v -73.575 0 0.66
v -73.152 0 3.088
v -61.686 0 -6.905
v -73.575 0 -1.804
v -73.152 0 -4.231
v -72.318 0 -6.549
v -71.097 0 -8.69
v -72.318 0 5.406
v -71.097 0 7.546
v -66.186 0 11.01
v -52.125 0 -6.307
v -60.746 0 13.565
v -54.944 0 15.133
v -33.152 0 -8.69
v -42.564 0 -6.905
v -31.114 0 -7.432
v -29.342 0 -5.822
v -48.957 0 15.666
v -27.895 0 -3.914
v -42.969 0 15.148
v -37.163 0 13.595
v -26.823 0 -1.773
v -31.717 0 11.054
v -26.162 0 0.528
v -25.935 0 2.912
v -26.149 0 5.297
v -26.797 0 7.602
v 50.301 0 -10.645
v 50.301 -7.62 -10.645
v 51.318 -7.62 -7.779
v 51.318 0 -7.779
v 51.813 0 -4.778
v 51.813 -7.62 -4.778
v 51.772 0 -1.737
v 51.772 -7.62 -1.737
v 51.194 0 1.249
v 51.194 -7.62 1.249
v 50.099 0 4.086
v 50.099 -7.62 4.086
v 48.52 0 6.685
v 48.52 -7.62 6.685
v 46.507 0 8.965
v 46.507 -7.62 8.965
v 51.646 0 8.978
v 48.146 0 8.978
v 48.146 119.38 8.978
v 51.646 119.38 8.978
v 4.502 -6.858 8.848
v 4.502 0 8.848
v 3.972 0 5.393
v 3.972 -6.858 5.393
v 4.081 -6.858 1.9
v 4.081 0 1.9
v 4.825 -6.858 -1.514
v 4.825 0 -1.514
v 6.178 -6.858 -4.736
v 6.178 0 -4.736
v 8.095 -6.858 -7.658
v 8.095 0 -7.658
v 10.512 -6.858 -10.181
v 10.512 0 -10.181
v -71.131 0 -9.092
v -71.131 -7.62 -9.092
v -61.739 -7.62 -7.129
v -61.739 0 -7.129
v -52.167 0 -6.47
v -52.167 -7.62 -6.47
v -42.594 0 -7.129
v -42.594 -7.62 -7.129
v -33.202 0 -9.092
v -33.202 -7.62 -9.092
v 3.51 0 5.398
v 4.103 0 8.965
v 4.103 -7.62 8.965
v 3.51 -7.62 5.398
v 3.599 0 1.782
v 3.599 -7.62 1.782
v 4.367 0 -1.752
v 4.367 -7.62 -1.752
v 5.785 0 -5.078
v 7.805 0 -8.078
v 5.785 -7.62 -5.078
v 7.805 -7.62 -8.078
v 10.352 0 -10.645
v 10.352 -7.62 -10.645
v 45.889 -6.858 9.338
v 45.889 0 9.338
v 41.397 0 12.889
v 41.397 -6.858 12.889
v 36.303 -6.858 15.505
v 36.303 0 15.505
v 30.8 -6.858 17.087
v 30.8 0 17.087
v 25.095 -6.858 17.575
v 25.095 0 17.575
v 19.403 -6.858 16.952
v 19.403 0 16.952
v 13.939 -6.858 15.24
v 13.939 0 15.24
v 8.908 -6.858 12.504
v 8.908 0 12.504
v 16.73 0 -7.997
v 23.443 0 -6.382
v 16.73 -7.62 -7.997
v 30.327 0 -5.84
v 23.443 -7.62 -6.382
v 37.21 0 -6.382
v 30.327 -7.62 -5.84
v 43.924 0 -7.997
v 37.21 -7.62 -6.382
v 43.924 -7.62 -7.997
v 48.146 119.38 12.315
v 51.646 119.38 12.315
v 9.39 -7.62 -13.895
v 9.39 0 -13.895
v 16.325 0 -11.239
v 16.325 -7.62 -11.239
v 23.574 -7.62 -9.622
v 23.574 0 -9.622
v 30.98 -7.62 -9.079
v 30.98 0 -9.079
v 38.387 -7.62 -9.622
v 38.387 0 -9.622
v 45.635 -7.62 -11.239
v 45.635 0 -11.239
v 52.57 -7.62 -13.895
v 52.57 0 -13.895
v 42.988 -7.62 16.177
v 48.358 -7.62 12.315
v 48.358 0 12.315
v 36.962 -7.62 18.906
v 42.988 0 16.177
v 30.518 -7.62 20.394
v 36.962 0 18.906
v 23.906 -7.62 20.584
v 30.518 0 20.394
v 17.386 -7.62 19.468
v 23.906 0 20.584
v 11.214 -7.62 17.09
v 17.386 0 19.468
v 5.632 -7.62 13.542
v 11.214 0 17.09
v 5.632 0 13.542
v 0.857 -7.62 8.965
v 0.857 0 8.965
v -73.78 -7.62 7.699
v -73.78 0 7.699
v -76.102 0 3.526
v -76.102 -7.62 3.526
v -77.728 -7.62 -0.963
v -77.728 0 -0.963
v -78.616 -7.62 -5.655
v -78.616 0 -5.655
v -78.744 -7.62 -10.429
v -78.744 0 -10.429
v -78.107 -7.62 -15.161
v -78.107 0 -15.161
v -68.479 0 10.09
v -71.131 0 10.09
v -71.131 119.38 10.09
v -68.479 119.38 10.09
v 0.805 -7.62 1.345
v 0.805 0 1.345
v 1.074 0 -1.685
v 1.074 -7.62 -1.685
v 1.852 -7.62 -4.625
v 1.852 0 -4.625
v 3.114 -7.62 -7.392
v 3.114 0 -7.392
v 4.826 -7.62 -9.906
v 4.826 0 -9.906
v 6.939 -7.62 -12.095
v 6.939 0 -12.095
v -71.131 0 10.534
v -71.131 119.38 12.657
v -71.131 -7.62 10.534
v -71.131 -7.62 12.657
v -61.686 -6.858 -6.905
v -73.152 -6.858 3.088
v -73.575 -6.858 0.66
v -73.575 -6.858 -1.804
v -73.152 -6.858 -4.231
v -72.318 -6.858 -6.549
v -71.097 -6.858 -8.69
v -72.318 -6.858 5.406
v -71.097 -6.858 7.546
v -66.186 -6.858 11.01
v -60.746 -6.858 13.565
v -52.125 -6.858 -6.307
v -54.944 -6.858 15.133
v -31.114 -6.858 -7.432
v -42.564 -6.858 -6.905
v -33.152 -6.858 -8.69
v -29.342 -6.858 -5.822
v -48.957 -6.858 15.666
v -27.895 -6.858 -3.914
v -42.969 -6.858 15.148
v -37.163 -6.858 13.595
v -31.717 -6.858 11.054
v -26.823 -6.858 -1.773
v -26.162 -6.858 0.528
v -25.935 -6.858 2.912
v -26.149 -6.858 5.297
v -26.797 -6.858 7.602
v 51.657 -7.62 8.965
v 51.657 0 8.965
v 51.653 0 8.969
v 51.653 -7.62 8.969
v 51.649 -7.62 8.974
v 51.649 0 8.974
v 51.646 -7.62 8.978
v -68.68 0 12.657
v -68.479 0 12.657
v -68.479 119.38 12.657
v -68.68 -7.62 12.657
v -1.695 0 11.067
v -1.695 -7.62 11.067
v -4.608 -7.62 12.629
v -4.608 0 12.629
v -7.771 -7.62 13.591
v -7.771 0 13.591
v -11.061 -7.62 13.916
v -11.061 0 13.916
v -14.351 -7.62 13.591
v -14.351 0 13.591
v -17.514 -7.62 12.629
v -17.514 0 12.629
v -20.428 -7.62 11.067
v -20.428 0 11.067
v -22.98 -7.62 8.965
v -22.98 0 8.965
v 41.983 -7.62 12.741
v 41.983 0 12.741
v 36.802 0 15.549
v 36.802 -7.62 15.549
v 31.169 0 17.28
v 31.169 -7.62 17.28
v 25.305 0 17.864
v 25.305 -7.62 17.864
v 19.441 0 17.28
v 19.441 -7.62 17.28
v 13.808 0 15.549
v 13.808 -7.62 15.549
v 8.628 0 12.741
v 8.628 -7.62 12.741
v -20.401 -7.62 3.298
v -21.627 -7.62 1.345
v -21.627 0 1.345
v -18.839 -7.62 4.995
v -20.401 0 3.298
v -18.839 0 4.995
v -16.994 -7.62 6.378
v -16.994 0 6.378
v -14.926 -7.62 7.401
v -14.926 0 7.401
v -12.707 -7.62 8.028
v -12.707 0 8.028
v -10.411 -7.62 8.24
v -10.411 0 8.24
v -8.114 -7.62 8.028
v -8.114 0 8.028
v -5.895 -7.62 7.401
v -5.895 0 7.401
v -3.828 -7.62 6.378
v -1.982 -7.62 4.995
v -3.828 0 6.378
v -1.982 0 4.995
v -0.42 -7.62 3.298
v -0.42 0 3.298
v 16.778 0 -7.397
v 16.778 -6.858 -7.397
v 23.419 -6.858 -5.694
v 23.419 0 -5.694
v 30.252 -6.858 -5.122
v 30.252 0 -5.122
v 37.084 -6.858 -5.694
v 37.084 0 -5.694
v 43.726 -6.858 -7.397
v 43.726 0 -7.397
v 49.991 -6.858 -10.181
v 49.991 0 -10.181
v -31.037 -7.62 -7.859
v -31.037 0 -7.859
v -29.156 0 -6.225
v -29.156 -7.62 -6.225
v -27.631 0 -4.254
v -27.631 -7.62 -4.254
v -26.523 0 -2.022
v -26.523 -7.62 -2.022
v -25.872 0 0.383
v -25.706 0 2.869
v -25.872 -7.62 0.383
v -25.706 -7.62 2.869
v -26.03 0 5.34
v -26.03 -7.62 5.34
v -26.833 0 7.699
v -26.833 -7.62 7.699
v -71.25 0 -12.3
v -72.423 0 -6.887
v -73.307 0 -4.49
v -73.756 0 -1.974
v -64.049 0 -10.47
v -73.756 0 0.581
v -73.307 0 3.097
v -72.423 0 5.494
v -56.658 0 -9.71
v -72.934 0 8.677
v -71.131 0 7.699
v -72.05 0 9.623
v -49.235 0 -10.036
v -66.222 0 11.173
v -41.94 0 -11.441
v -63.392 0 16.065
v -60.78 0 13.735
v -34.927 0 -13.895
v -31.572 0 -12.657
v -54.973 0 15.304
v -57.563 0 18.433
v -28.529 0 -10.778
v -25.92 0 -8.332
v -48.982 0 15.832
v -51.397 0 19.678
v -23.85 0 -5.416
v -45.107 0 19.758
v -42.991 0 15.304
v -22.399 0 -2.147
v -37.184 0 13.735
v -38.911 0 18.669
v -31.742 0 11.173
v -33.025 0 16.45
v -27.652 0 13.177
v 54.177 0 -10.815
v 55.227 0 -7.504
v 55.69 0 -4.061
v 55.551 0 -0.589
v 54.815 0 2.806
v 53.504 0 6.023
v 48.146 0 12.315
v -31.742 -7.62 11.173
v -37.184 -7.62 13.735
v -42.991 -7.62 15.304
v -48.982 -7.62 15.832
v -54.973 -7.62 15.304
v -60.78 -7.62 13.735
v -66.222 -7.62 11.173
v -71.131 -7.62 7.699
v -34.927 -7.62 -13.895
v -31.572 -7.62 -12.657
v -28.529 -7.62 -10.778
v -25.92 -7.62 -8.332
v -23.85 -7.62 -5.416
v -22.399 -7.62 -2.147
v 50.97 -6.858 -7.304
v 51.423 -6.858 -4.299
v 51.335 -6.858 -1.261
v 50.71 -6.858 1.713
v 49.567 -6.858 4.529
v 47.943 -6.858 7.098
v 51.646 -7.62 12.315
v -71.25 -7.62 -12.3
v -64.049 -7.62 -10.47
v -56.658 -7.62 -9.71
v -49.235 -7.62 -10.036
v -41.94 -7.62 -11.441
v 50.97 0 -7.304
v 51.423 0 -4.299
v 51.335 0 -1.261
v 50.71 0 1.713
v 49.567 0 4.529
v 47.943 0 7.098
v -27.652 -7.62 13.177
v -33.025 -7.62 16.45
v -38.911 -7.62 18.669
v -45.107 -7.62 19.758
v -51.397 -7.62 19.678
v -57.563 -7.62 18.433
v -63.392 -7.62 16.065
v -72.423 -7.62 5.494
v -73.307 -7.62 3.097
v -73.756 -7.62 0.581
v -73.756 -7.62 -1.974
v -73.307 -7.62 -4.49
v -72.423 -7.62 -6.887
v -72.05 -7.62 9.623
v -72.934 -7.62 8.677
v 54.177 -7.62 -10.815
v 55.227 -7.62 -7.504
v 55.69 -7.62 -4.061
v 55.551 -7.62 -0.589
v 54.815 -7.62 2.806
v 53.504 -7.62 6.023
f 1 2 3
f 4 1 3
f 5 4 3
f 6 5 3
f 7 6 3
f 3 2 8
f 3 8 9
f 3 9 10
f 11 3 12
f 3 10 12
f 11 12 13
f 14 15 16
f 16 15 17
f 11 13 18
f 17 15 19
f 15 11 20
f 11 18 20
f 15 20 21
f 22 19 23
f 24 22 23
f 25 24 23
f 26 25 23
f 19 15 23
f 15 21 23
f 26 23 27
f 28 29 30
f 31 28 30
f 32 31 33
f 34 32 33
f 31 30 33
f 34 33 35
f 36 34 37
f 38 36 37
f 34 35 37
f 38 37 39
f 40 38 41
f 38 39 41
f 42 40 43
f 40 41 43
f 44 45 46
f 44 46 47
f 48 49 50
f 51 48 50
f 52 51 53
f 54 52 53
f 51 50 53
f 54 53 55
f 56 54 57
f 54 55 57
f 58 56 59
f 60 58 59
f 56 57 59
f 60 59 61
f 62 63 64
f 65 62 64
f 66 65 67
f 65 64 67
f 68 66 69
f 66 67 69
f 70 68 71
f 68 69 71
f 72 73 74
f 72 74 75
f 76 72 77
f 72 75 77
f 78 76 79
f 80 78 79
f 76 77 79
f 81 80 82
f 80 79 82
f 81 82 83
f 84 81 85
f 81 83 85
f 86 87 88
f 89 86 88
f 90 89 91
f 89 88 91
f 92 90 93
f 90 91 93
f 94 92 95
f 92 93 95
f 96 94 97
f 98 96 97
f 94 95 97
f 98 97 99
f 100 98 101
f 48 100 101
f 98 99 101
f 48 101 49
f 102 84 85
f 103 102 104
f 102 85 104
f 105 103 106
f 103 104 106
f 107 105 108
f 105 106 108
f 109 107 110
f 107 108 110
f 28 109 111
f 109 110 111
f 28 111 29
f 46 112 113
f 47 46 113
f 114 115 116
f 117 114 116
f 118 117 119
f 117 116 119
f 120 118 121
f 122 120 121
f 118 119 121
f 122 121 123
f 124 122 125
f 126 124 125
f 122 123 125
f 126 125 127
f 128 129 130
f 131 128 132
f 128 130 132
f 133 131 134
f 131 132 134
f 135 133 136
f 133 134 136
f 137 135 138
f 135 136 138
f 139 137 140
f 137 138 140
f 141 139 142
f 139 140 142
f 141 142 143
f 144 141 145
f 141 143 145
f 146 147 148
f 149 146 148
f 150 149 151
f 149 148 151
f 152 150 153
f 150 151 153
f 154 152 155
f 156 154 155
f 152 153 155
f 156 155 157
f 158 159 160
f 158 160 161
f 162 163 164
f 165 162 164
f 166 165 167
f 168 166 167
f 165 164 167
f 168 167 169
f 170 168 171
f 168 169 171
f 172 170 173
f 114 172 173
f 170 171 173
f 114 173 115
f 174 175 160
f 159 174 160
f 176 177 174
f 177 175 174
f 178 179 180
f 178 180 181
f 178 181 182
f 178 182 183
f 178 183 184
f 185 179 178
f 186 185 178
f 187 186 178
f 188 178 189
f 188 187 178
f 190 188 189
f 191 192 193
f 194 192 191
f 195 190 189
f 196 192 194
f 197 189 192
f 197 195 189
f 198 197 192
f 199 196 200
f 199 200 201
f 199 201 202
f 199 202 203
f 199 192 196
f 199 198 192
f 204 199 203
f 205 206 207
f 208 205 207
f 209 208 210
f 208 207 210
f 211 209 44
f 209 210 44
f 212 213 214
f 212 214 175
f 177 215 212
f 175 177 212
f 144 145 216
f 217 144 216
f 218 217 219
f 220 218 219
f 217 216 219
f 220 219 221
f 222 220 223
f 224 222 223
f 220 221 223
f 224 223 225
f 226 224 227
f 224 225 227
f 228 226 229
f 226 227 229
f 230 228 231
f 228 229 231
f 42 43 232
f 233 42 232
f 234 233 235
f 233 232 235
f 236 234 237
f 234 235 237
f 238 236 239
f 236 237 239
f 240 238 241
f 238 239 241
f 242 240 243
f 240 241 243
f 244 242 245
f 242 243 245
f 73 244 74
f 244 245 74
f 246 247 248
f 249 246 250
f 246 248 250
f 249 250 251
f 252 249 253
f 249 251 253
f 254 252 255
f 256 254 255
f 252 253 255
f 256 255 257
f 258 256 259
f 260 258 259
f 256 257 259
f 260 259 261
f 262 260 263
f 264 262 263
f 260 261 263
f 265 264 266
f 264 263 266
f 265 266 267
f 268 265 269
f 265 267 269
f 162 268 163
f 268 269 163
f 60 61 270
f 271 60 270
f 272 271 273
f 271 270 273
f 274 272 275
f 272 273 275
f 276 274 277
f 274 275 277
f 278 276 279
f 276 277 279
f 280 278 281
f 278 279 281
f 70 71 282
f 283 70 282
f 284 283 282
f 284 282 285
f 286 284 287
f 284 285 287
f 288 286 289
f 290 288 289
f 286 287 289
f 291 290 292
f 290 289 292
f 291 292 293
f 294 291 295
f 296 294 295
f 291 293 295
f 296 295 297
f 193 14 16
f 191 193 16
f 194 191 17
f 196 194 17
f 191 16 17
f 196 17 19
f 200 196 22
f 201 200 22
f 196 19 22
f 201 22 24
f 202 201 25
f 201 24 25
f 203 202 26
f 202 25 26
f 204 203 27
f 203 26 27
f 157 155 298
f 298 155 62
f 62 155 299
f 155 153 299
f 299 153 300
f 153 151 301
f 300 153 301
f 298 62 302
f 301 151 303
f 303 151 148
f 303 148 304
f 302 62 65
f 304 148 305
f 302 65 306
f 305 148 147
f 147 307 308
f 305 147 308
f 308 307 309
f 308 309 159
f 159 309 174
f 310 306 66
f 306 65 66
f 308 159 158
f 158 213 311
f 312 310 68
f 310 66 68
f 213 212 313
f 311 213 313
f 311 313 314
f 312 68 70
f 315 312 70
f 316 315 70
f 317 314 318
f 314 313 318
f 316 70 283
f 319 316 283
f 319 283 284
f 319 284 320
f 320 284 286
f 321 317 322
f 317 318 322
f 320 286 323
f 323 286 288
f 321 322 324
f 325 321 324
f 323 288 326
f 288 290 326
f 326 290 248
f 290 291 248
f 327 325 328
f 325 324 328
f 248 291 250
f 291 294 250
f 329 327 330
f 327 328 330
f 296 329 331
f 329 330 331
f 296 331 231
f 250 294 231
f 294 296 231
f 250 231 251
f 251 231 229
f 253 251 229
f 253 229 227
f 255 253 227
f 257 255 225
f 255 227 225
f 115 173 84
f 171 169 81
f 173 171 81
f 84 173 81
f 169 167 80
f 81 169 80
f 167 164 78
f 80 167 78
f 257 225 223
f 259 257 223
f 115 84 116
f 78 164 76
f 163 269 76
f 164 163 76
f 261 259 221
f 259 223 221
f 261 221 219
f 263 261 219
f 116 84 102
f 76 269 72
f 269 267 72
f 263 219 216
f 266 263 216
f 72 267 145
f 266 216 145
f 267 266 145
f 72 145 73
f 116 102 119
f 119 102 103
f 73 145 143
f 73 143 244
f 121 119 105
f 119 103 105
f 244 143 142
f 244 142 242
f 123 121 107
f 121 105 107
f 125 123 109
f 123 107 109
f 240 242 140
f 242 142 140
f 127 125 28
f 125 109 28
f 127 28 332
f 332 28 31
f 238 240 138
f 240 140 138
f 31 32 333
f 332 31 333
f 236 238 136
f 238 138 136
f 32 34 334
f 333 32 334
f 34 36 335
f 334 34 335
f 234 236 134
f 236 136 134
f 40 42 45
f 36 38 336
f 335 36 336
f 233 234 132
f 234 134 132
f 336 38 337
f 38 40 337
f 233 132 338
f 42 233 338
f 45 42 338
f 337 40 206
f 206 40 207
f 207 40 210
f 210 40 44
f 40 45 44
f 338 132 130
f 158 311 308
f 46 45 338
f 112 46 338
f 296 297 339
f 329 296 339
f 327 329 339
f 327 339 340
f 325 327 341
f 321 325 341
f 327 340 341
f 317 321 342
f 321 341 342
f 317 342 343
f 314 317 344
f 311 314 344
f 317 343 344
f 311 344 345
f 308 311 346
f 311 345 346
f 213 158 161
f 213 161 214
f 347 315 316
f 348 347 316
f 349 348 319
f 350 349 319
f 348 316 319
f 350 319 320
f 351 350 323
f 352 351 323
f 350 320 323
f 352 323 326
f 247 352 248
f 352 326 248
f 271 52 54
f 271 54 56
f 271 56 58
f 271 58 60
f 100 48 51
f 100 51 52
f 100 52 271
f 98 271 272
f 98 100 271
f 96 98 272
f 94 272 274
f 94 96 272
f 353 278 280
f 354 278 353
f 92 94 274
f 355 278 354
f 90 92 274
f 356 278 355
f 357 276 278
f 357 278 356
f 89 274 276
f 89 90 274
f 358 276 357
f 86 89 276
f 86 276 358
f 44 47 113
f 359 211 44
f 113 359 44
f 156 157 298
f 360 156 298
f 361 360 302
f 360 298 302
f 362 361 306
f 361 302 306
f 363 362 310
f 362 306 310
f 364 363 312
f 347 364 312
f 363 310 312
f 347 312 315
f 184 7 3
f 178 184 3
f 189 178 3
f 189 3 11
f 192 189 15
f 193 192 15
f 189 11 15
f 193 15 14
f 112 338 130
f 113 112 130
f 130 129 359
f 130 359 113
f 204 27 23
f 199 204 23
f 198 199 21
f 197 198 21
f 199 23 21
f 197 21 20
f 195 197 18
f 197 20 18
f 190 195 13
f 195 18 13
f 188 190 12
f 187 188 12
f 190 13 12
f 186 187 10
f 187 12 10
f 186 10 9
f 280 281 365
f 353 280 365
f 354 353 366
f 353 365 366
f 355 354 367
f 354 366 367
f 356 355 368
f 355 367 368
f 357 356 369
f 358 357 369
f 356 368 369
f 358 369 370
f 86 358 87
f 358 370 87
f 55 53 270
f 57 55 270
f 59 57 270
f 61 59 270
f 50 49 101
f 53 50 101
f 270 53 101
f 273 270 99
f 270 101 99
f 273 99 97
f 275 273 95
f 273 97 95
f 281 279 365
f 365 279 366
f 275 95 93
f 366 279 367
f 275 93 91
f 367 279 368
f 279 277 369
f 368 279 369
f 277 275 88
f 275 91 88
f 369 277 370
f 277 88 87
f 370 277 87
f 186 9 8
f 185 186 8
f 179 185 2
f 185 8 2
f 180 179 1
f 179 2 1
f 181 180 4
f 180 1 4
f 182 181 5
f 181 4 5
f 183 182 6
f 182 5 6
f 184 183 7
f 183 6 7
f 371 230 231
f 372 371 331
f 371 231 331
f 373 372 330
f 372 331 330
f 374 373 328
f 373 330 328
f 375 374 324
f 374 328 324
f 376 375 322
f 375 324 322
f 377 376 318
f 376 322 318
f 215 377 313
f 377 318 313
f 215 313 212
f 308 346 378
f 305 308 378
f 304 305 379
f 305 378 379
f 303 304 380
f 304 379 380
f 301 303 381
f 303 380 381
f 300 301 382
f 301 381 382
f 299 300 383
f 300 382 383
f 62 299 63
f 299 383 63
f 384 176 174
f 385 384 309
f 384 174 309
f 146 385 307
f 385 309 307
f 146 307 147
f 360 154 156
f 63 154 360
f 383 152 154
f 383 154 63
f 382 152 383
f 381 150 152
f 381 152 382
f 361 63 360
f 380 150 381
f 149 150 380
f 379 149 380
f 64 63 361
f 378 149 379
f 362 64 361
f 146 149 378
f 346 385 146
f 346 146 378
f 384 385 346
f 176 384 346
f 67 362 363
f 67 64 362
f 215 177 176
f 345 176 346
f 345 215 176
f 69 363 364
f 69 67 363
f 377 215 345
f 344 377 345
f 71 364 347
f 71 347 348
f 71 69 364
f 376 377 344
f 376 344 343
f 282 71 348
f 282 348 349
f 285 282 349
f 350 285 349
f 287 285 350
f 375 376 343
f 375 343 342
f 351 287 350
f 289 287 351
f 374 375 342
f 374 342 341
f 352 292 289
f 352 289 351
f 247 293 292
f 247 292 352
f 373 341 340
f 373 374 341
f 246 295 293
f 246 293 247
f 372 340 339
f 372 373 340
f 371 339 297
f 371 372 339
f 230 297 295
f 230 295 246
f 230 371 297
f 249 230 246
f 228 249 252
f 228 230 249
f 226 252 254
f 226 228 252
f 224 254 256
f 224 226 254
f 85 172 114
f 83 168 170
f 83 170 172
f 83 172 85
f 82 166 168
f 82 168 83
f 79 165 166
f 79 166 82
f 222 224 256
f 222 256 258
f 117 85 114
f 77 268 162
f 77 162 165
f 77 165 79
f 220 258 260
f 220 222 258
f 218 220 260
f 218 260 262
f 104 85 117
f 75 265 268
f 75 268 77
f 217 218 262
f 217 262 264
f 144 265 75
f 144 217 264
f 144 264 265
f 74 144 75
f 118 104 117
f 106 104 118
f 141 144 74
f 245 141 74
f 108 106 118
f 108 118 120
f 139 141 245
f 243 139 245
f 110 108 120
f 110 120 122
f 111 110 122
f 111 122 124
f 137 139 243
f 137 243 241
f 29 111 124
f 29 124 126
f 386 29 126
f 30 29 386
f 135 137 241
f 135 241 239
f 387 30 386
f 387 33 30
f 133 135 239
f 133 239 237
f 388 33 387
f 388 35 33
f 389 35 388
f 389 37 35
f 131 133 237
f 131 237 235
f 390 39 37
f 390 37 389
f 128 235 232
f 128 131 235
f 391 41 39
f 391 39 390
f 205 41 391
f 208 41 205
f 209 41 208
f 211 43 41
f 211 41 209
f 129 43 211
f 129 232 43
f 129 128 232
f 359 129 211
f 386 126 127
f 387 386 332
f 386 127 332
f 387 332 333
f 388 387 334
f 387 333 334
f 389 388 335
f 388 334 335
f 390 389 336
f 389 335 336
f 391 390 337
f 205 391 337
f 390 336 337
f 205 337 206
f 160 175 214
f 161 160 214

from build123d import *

# Parameters (mm, degrees)
F1_DEPTH  = 7.62
F2_W      = 3.5081729293
F2_H      = 3.3370414749
F3_DEPTH  = 25.4
F4_W      = 2.6525259018
F4_H      = 2.5669550523
F5_DEPTH  = 25.4
F9_DEPTH  = 25.4
F11_DEPTH = 6.858
F13_DEPTH = 25.4
F15_DEPTH = 6.858
F7_W      = 3.499371708
F7_H      = 3.3370414749
F16_DEPTH = 127


with BuildPart() as f1:
    # F0 (on Front) → F1 (new body)
    with BuildSketch(Plane.XZ):
        with BuildLine():
            ThreePointArc((51.6570120453, 8.9649045263), (26.2570120453, 20.667213597), (0.8570120453, 8.9649045263))
            ThreePointArc((0.8570120453, 8.9649045263), (-11.0614482688, 13.9160362753), (-22.9799085829, 8.9649045263))
            ThreePointArc((-22.9799085829, 8.9649045263), (-48.6671182353, 19.8569467975), (-73.7799085829, 7.6989417998))
            ThreePointArc((-73.7799085829, 7.6989417998), (-78.2661911383, -3.2913957408), (-78.1069318422, -15.1610582002))
            ThreePointArc((-78.1069318422, -15.1610582002), (-56.6582008575, -9.7096126313), (-34.9269318422, -13.8950954737))
            ThreePointArc((-34.9269318422, -13.8950954737), (-25.9203901661, -8.3316477048), (-21.6268973038, 1.3449045263))
            ThreePointArc((-21.6268973038, 1.3449045263), (-10.4107487865, 8.2396368891), (0.8053997308, 1.3449045263))
            ThreePointArc((0.8053997308, 1.3449045263), (3.1142404967, -7.3924418733), (9.3901837679, -13.8950954737))
            ThreePointArc((9.3901837679, -13.8950954737), (30.9801837679, -9.0789176289), (52.5701837679, -13.8950954737))
            ThreePointArc((52.5701837679, -13.8950954737), (55.6960845757, -2.3219884954), (51.6570120453, 8.9649045263))
        make_face()
    extrude(amount=F1_DEPTH)

    # F2 (on face) → F3 (cut)
    with BuildSketch(Plane.XZ.offset(7.62)):
        with Locations((49.9004349113, 10.6466268189)):
            Rectangle(F2_W, F2_H)
    extrude(amount=-F3_DEPTH, mode=Mode.SUBTRACT)

    # F4 (on face) → F5 (cut)
    with BuildSketch(Plane.XZ.offset(7.62)):
        with Locations((-69.8052272201, 11.3739320077)):
            Rectangle(F4_W, F4_H)
    extrude(amount=-F5_DEPTH, mode=Mode.SUBTRACT)

    # F8 (on face) → F9 (cut)
    with BuildSketch(Plane.XZ.offset(7.62)):
        with BuildLine():
            ThreePointArc((-33.202290535, -9.0922256932), (-26.5225166851, -2.0224355139), (-26.8325731158, 7.6989417998))
            ThreePointArc((-26.8325731158, 7.6989417998), (-48.9820316434, 15.8321468799), (-71.131490171, 7.6989417998))
            ThreePointArc((-71.131490171, 7.6989417998), (-73.8122563738, -0.6966419467), (-71.131490171, -9.0922256932))
            ThreePointArc((-71.131490171, -9.0922256932), (-52.166890353, -6.4703124091), (-33.202290535, -9.0922256932))
        make_face()
    extrude(amount=-F9_DEPTH, mode=Mode.SUBTRACT)

    # F12 (on face) → F13 (cut)
    with BuildSketch(Plane.XZ.offset(7.62)):
        with BuildLine():
            ThreePointArc((50.3011606634, -10.6448102742), (51.5490277497, -0.2314904944), (46.5071313083, 8.9649045263))
            ThreePointArc((46.5071313083, 8.9649045263), (25.3052259795, 17.8641451804), (4.1033206508, 8.9649045263))
            ThreePointArc((4.1033206508, 8.9649045263), (4.3666706149, -1.7517064777), (10.3523042053, -10.6448102742))
            ThreePointArc((10.3523042053, -10.6448102742), (30.3267324343, -5.839525082), (50.3011606634, -10.6448102742))
        make_face()
    extrude(amount=-F13_DEPTH, mode=Mode.SUBTRACT)

    # F7 (on face) + F6 (on face) → F16 (join)
    with BuildSketch(Plane.XZ.offset(7.62)):
        with Locations((49.8960343006, 10.6466268189)):
            Rectangle(F7_W, F7_H)
    with BuildSketch(Plane.XZ.offset(7.62)):
        Polygon((-68.4789642692, 10.0904544815), (-68.4789642692, 12.6574095339), (-68.6795919821, 12.6574095339), (-71.131490171, 12.6574095339), (-71.131490171, 10.5336160475), (-71.131490171, 10.0904544815), align=None)
    extrude(amount=-F16_DEPTH)


with BuildPart() as f11:
    # F10 (on face) → F11 (new body)
    with BuildSketch(Plane.XZ):
        with BuildLine():
            ThreePointArc((-33.1520698965, -8.6897080764), (-26.8230920622, -1.773005559), (-26.7965905368, 7.6022827998))
            ThreePointArc((-26.7965905368, 7.6022827998), (-48.957192441, 15.6664707084), (-71.0974112153, 7.5464881957))
            ThreePointArc((-71.0974112153, 7.5464881957), (-73.6286093359, -0.5716099404), (-71.0974112153, -8.6897080764))
            ThreePointArc((-71.0974112153, -8.6897080764), (-52.1247405559, -6.306884933), (-33.1520698965, -8.6897080764))
        make_face()
    extrude(amount=F11_DEPTH)


with BuildPart() as f15:
    # F14 (on face) → F15 (new body)
    with BuildSketch(Plane.XZ):
        with BuildLine():
            ThreePointArc((49.9911569059, -10.1813292131), (51.0891638669, 0.2400504094), (45.8889044821, 9.3377465382))
            ThreePointArc((45.8889044821, 9.3377465382), (25.0947840747, 17.5750271949), (4.5016123913, 8.8475123048))
            ThreePointArc((4.5016123913, 8.8475123048), (4.8246815973, -1.5141317655), (10.512188077, -10.1813292131))
            ThreePointArc((10.512188077, -10.1813292131), (30.2516724914, -5.1216910352), (49.9911569059, -10.1813292131))
        make_face()
    extrude(amount=F15_DEPTH)


solid = Compound([f1.part, f11.part, f15.part])
